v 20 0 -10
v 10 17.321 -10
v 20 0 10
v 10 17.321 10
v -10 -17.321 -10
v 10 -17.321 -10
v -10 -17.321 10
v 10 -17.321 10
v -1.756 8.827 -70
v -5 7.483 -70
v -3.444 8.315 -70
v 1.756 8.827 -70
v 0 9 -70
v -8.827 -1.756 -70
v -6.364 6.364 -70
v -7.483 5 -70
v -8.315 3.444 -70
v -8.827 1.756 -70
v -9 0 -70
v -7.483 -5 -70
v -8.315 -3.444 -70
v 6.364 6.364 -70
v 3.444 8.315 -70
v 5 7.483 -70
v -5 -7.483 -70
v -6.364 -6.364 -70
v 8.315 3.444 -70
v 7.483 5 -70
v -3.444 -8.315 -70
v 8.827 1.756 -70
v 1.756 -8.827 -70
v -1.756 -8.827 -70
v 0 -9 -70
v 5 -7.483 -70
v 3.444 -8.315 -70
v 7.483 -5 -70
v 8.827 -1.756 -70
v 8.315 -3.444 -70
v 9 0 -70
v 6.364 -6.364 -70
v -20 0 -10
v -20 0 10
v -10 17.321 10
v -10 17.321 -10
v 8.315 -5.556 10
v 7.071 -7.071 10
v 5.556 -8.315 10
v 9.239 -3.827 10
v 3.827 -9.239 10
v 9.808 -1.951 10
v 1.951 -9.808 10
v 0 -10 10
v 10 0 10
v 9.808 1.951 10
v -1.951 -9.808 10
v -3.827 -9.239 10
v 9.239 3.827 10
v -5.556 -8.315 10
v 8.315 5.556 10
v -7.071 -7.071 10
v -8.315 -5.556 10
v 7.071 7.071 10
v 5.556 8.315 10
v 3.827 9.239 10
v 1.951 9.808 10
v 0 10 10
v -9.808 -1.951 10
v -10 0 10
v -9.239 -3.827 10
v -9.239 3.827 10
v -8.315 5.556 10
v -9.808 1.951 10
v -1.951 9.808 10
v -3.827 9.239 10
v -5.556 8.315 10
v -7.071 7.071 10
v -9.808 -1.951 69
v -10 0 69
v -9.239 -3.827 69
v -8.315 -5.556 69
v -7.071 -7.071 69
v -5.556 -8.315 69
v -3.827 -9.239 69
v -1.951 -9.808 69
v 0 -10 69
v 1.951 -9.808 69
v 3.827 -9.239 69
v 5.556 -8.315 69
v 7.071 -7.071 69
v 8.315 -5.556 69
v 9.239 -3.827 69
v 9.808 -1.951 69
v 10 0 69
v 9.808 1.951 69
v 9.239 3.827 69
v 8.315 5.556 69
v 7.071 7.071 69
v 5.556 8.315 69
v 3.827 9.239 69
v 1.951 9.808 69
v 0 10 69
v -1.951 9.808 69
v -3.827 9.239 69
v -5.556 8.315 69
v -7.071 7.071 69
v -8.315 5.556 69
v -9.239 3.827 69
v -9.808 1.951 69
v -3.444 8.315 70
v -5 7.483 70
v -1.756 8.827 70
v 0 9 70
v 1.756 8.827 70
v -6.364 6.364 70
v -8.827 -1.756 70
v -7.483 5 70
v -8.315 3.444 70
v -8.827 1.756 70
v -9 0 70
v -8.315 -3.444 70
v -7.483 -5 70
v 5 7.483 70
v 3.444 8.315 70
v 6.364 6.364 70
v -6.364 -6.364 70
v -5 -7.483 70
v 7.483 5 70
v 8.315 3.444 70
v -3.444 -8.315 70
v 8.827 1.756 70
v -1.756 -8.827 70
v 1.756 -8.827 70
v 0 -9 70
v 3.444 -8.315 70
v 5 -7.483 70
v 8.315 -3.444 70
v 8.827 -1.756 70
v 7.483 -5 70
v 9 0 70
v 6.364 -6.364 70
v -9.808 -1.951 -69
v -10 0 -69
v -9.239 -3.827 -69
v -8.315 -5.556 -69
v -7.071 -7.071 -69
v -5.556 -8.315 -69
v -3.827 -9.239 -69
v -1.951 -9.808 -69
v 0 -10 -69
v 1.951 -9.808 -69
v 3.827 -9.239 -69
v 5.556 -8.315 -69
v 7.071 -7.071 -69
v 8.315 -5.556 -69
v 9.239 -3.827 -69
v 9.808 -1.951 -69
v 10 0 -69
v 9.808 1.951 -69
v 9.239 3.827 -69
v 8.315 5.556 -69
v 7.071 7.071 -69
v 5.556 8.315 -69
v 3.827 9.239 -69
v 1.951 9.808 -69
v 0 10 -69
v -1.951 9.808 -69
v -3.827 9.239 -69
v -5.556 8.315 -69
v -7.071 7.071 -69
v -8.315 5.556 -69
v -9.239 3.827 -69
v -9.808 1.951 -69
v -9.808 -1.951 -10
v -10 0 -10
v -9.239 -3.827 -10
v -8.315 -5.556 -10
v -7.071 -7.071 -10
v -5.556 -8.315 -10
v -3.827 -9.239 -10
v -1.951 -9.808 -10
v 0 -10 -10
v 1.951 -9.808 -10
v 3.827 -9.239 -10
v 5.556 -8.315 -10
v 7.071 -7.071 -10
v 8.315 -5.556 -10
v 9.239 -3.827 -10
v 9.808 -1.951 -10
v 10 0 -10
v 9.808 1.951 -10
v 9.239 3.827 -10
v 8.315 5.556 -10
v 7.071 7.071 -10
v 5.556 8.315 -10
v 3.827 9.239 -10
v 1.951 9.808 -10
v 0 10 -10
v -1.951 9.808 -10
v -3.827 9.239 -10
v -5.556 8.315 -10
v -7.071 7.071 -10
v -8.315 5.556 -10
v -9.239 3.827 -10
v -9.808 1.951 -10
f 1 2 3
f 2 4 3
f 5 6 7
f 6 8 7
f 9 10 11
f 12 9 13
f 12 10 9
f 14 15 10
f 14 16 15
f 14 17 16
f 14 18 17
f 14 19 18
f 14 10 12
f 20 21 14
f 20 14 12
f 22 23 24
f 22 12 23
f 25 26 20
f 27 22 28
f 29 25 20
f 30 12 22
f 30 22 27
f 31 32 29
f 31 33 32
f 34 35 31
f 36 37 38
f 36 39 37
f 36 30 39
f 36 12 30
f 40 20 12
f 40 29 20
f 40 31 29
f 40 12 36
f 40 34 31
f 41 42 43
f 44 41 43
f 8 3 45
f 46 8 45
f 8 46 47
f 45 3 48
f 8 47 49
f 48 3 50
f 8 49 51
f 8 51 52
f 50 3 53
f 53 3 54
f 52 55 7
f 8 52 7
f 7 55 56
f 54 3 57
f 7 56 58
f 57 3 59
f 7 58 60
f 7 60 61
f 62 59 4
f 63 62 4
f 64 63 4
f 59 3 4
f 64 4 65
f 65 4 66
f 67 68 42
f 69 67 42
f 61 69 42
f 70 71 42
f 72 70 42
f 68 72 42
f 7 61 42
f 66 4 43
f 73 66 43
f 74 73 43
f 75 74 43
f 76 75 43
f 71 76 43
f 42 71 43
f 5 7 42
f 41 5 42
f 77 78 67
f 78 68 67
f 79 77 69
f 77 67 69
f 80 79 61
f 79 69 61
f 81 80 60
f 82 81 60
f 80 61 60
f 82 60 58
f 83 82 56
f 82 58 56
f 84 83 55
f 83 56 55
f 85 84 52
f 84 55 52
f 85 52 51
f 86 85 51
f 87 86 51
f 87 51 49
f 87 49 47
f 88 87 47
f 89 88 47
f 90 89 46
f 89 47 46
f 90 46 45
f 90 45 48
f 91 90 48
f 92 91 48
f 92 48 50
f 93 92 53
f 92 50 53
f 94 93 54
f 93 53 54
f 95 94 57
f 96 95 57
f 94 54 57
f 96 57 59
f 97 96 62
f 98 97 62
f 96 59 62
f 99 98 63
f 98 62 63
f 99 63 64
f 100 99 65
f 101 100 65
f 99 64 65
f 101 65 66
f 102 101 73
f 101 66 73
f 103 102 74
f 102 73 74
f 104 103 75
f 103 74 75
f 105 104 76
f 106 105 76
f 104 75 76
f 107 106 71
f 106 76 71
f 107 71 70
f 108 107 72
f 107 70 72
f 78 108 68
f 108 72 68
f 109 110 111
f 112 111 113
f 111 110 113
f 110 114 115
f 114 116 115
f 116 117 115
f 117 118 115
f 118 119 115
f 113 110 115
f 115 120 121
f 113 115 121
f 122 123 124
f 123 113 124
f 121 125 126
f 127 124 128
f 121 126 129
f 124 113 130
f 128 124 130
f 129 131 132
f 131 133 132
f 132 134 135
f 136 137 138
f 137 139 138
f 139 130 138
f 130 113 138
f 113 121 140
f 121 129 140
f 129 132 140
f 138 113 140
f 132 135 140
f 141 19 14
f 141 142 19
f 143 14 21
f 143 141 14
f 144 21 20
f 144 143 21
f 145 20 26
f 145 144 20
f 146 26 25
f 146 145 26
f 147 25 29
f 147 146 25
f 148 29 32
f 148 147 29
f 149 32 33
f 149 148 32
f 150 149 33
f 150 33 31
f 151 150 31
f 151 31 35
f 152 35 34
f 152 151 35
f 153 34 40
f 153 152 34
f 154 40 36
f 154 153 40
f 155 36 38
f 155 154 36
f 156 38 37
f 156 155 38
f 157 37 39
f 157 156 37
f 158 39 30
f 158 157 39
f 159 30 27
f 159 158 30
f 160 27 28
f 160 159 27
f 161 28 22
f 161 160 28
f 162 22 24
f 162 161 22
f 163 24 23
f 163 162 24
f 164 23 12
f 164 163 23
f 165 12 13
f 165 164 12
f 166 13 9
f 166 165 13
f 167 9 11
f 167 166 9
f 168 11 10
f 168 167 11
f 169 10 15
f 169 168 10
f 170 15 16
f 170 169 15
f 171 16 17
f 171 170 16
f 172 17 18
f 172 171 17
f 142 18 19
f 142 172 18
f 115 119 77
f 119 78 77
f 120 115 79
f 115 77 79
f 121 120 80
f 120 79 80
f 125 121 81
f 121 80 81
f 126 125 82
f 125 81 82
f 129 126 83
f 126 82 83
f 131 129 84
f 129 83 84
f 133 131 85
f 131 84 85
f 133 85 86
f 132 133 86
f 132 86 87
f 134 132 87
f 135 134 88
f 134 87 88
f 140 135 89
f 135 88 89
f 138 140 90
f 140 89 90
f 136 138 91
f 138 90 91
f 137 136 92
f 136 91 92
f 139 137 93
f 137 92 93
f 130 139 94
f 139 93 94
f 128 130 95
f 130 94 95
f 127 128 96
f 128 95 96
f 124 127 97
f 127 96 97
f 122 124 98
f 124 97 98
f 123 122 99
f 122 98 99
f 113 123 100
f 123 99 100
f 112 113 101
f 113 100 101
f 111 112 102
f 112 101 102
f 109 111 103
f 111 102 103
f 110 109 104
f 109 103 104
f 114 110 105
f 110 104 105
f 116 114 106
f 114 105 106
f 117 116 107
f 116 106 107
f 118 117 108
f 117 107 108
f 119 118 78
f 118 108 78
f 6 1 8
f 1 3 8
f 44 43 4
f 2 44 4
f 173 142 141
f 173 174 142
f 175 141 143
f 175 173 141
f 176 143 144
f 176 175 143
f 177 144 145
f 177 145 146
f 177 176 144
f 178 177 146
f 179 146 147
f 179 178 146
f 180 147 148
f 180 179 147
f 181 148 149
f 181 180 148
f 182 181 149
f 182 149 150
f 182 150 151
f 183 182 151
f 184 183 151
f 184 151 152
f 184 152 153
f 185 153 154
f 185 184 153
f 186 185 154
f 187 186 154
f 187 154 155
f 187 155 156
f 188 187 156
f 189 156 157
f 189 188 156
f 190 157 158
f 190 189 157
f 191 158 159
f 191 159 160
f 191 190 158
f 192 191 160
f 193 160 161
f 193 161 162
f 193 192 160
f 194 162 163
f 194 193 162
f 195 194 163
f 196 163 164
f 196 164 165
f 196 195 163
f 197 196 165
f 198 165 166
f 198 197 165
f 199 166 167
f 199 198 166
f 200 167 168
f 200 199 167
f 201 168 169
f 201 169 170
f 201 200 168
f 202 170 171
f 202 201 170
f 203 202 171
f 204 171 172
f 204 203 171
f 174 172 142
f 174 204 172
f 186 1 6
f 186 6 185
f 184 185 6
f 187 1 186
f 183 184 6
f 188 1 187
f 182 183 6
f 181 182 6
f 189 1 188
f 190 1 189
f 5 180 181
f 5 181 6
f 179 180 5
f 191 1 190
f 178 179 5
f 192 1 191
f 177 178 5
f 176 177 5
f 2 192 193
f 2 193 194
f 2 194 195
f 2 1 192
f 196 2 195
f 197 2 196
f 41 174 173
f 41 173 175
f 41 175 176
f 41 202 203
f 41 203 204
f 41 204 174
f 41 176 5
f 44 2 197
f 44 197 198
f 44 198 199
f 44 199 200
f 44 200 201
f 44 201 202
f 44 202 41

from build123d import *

# Parameters (mm, degrees)
BOSS_EXTRU_1_DEPTH = 10


with BuildPart() as part:
    # Esquisse1 → Boss.-Extru.1 (new body)
    with BuildSketch(Plane.XY):
        Polygon((-10, 17.320508076), (10, 17.320508076), (20, 0), (10, -17.320508076), (-10, -17.320508076), (-20, 0), align=None)
    boss_extru_1 = extrude(amount=BOSS_EXTRU_1_DEPTH)

    # Esquisse2 → Révolution1 (revolve)
    with BuildSketch(Plane(origin=(0, 0, 0), x_dir=(1, 0, 0), z_dir=(0, 1, 0)), mode=Mode.PRIVATE) as r_volution1_sk:
        Polygon((0, -10), (0, -70), (9, -70), (10, -69), (10, -10), align=None)
    r_volution1 = revolve(r_volution1_sk.sketch.rotate(Axis((0, 0, 10), (0, 0, 1)), 180), axis=Axis((0, 0, 10), (0, 0, 1)))

    # Symétrie1: Boss.-Extru.1, Révolution1 across plane
    add(boss_extru_1.mirror(Plane(origin=(0, 0, 0), x_dir=(1, 0, 0), z_dir=(0, 0, -1))))
    add(r_volution1.mirror(Plane(origin=(0, 0, 0), x_dir=(1, 0, 0), z_dir=(0, 0, -1))))


solid = part.part
